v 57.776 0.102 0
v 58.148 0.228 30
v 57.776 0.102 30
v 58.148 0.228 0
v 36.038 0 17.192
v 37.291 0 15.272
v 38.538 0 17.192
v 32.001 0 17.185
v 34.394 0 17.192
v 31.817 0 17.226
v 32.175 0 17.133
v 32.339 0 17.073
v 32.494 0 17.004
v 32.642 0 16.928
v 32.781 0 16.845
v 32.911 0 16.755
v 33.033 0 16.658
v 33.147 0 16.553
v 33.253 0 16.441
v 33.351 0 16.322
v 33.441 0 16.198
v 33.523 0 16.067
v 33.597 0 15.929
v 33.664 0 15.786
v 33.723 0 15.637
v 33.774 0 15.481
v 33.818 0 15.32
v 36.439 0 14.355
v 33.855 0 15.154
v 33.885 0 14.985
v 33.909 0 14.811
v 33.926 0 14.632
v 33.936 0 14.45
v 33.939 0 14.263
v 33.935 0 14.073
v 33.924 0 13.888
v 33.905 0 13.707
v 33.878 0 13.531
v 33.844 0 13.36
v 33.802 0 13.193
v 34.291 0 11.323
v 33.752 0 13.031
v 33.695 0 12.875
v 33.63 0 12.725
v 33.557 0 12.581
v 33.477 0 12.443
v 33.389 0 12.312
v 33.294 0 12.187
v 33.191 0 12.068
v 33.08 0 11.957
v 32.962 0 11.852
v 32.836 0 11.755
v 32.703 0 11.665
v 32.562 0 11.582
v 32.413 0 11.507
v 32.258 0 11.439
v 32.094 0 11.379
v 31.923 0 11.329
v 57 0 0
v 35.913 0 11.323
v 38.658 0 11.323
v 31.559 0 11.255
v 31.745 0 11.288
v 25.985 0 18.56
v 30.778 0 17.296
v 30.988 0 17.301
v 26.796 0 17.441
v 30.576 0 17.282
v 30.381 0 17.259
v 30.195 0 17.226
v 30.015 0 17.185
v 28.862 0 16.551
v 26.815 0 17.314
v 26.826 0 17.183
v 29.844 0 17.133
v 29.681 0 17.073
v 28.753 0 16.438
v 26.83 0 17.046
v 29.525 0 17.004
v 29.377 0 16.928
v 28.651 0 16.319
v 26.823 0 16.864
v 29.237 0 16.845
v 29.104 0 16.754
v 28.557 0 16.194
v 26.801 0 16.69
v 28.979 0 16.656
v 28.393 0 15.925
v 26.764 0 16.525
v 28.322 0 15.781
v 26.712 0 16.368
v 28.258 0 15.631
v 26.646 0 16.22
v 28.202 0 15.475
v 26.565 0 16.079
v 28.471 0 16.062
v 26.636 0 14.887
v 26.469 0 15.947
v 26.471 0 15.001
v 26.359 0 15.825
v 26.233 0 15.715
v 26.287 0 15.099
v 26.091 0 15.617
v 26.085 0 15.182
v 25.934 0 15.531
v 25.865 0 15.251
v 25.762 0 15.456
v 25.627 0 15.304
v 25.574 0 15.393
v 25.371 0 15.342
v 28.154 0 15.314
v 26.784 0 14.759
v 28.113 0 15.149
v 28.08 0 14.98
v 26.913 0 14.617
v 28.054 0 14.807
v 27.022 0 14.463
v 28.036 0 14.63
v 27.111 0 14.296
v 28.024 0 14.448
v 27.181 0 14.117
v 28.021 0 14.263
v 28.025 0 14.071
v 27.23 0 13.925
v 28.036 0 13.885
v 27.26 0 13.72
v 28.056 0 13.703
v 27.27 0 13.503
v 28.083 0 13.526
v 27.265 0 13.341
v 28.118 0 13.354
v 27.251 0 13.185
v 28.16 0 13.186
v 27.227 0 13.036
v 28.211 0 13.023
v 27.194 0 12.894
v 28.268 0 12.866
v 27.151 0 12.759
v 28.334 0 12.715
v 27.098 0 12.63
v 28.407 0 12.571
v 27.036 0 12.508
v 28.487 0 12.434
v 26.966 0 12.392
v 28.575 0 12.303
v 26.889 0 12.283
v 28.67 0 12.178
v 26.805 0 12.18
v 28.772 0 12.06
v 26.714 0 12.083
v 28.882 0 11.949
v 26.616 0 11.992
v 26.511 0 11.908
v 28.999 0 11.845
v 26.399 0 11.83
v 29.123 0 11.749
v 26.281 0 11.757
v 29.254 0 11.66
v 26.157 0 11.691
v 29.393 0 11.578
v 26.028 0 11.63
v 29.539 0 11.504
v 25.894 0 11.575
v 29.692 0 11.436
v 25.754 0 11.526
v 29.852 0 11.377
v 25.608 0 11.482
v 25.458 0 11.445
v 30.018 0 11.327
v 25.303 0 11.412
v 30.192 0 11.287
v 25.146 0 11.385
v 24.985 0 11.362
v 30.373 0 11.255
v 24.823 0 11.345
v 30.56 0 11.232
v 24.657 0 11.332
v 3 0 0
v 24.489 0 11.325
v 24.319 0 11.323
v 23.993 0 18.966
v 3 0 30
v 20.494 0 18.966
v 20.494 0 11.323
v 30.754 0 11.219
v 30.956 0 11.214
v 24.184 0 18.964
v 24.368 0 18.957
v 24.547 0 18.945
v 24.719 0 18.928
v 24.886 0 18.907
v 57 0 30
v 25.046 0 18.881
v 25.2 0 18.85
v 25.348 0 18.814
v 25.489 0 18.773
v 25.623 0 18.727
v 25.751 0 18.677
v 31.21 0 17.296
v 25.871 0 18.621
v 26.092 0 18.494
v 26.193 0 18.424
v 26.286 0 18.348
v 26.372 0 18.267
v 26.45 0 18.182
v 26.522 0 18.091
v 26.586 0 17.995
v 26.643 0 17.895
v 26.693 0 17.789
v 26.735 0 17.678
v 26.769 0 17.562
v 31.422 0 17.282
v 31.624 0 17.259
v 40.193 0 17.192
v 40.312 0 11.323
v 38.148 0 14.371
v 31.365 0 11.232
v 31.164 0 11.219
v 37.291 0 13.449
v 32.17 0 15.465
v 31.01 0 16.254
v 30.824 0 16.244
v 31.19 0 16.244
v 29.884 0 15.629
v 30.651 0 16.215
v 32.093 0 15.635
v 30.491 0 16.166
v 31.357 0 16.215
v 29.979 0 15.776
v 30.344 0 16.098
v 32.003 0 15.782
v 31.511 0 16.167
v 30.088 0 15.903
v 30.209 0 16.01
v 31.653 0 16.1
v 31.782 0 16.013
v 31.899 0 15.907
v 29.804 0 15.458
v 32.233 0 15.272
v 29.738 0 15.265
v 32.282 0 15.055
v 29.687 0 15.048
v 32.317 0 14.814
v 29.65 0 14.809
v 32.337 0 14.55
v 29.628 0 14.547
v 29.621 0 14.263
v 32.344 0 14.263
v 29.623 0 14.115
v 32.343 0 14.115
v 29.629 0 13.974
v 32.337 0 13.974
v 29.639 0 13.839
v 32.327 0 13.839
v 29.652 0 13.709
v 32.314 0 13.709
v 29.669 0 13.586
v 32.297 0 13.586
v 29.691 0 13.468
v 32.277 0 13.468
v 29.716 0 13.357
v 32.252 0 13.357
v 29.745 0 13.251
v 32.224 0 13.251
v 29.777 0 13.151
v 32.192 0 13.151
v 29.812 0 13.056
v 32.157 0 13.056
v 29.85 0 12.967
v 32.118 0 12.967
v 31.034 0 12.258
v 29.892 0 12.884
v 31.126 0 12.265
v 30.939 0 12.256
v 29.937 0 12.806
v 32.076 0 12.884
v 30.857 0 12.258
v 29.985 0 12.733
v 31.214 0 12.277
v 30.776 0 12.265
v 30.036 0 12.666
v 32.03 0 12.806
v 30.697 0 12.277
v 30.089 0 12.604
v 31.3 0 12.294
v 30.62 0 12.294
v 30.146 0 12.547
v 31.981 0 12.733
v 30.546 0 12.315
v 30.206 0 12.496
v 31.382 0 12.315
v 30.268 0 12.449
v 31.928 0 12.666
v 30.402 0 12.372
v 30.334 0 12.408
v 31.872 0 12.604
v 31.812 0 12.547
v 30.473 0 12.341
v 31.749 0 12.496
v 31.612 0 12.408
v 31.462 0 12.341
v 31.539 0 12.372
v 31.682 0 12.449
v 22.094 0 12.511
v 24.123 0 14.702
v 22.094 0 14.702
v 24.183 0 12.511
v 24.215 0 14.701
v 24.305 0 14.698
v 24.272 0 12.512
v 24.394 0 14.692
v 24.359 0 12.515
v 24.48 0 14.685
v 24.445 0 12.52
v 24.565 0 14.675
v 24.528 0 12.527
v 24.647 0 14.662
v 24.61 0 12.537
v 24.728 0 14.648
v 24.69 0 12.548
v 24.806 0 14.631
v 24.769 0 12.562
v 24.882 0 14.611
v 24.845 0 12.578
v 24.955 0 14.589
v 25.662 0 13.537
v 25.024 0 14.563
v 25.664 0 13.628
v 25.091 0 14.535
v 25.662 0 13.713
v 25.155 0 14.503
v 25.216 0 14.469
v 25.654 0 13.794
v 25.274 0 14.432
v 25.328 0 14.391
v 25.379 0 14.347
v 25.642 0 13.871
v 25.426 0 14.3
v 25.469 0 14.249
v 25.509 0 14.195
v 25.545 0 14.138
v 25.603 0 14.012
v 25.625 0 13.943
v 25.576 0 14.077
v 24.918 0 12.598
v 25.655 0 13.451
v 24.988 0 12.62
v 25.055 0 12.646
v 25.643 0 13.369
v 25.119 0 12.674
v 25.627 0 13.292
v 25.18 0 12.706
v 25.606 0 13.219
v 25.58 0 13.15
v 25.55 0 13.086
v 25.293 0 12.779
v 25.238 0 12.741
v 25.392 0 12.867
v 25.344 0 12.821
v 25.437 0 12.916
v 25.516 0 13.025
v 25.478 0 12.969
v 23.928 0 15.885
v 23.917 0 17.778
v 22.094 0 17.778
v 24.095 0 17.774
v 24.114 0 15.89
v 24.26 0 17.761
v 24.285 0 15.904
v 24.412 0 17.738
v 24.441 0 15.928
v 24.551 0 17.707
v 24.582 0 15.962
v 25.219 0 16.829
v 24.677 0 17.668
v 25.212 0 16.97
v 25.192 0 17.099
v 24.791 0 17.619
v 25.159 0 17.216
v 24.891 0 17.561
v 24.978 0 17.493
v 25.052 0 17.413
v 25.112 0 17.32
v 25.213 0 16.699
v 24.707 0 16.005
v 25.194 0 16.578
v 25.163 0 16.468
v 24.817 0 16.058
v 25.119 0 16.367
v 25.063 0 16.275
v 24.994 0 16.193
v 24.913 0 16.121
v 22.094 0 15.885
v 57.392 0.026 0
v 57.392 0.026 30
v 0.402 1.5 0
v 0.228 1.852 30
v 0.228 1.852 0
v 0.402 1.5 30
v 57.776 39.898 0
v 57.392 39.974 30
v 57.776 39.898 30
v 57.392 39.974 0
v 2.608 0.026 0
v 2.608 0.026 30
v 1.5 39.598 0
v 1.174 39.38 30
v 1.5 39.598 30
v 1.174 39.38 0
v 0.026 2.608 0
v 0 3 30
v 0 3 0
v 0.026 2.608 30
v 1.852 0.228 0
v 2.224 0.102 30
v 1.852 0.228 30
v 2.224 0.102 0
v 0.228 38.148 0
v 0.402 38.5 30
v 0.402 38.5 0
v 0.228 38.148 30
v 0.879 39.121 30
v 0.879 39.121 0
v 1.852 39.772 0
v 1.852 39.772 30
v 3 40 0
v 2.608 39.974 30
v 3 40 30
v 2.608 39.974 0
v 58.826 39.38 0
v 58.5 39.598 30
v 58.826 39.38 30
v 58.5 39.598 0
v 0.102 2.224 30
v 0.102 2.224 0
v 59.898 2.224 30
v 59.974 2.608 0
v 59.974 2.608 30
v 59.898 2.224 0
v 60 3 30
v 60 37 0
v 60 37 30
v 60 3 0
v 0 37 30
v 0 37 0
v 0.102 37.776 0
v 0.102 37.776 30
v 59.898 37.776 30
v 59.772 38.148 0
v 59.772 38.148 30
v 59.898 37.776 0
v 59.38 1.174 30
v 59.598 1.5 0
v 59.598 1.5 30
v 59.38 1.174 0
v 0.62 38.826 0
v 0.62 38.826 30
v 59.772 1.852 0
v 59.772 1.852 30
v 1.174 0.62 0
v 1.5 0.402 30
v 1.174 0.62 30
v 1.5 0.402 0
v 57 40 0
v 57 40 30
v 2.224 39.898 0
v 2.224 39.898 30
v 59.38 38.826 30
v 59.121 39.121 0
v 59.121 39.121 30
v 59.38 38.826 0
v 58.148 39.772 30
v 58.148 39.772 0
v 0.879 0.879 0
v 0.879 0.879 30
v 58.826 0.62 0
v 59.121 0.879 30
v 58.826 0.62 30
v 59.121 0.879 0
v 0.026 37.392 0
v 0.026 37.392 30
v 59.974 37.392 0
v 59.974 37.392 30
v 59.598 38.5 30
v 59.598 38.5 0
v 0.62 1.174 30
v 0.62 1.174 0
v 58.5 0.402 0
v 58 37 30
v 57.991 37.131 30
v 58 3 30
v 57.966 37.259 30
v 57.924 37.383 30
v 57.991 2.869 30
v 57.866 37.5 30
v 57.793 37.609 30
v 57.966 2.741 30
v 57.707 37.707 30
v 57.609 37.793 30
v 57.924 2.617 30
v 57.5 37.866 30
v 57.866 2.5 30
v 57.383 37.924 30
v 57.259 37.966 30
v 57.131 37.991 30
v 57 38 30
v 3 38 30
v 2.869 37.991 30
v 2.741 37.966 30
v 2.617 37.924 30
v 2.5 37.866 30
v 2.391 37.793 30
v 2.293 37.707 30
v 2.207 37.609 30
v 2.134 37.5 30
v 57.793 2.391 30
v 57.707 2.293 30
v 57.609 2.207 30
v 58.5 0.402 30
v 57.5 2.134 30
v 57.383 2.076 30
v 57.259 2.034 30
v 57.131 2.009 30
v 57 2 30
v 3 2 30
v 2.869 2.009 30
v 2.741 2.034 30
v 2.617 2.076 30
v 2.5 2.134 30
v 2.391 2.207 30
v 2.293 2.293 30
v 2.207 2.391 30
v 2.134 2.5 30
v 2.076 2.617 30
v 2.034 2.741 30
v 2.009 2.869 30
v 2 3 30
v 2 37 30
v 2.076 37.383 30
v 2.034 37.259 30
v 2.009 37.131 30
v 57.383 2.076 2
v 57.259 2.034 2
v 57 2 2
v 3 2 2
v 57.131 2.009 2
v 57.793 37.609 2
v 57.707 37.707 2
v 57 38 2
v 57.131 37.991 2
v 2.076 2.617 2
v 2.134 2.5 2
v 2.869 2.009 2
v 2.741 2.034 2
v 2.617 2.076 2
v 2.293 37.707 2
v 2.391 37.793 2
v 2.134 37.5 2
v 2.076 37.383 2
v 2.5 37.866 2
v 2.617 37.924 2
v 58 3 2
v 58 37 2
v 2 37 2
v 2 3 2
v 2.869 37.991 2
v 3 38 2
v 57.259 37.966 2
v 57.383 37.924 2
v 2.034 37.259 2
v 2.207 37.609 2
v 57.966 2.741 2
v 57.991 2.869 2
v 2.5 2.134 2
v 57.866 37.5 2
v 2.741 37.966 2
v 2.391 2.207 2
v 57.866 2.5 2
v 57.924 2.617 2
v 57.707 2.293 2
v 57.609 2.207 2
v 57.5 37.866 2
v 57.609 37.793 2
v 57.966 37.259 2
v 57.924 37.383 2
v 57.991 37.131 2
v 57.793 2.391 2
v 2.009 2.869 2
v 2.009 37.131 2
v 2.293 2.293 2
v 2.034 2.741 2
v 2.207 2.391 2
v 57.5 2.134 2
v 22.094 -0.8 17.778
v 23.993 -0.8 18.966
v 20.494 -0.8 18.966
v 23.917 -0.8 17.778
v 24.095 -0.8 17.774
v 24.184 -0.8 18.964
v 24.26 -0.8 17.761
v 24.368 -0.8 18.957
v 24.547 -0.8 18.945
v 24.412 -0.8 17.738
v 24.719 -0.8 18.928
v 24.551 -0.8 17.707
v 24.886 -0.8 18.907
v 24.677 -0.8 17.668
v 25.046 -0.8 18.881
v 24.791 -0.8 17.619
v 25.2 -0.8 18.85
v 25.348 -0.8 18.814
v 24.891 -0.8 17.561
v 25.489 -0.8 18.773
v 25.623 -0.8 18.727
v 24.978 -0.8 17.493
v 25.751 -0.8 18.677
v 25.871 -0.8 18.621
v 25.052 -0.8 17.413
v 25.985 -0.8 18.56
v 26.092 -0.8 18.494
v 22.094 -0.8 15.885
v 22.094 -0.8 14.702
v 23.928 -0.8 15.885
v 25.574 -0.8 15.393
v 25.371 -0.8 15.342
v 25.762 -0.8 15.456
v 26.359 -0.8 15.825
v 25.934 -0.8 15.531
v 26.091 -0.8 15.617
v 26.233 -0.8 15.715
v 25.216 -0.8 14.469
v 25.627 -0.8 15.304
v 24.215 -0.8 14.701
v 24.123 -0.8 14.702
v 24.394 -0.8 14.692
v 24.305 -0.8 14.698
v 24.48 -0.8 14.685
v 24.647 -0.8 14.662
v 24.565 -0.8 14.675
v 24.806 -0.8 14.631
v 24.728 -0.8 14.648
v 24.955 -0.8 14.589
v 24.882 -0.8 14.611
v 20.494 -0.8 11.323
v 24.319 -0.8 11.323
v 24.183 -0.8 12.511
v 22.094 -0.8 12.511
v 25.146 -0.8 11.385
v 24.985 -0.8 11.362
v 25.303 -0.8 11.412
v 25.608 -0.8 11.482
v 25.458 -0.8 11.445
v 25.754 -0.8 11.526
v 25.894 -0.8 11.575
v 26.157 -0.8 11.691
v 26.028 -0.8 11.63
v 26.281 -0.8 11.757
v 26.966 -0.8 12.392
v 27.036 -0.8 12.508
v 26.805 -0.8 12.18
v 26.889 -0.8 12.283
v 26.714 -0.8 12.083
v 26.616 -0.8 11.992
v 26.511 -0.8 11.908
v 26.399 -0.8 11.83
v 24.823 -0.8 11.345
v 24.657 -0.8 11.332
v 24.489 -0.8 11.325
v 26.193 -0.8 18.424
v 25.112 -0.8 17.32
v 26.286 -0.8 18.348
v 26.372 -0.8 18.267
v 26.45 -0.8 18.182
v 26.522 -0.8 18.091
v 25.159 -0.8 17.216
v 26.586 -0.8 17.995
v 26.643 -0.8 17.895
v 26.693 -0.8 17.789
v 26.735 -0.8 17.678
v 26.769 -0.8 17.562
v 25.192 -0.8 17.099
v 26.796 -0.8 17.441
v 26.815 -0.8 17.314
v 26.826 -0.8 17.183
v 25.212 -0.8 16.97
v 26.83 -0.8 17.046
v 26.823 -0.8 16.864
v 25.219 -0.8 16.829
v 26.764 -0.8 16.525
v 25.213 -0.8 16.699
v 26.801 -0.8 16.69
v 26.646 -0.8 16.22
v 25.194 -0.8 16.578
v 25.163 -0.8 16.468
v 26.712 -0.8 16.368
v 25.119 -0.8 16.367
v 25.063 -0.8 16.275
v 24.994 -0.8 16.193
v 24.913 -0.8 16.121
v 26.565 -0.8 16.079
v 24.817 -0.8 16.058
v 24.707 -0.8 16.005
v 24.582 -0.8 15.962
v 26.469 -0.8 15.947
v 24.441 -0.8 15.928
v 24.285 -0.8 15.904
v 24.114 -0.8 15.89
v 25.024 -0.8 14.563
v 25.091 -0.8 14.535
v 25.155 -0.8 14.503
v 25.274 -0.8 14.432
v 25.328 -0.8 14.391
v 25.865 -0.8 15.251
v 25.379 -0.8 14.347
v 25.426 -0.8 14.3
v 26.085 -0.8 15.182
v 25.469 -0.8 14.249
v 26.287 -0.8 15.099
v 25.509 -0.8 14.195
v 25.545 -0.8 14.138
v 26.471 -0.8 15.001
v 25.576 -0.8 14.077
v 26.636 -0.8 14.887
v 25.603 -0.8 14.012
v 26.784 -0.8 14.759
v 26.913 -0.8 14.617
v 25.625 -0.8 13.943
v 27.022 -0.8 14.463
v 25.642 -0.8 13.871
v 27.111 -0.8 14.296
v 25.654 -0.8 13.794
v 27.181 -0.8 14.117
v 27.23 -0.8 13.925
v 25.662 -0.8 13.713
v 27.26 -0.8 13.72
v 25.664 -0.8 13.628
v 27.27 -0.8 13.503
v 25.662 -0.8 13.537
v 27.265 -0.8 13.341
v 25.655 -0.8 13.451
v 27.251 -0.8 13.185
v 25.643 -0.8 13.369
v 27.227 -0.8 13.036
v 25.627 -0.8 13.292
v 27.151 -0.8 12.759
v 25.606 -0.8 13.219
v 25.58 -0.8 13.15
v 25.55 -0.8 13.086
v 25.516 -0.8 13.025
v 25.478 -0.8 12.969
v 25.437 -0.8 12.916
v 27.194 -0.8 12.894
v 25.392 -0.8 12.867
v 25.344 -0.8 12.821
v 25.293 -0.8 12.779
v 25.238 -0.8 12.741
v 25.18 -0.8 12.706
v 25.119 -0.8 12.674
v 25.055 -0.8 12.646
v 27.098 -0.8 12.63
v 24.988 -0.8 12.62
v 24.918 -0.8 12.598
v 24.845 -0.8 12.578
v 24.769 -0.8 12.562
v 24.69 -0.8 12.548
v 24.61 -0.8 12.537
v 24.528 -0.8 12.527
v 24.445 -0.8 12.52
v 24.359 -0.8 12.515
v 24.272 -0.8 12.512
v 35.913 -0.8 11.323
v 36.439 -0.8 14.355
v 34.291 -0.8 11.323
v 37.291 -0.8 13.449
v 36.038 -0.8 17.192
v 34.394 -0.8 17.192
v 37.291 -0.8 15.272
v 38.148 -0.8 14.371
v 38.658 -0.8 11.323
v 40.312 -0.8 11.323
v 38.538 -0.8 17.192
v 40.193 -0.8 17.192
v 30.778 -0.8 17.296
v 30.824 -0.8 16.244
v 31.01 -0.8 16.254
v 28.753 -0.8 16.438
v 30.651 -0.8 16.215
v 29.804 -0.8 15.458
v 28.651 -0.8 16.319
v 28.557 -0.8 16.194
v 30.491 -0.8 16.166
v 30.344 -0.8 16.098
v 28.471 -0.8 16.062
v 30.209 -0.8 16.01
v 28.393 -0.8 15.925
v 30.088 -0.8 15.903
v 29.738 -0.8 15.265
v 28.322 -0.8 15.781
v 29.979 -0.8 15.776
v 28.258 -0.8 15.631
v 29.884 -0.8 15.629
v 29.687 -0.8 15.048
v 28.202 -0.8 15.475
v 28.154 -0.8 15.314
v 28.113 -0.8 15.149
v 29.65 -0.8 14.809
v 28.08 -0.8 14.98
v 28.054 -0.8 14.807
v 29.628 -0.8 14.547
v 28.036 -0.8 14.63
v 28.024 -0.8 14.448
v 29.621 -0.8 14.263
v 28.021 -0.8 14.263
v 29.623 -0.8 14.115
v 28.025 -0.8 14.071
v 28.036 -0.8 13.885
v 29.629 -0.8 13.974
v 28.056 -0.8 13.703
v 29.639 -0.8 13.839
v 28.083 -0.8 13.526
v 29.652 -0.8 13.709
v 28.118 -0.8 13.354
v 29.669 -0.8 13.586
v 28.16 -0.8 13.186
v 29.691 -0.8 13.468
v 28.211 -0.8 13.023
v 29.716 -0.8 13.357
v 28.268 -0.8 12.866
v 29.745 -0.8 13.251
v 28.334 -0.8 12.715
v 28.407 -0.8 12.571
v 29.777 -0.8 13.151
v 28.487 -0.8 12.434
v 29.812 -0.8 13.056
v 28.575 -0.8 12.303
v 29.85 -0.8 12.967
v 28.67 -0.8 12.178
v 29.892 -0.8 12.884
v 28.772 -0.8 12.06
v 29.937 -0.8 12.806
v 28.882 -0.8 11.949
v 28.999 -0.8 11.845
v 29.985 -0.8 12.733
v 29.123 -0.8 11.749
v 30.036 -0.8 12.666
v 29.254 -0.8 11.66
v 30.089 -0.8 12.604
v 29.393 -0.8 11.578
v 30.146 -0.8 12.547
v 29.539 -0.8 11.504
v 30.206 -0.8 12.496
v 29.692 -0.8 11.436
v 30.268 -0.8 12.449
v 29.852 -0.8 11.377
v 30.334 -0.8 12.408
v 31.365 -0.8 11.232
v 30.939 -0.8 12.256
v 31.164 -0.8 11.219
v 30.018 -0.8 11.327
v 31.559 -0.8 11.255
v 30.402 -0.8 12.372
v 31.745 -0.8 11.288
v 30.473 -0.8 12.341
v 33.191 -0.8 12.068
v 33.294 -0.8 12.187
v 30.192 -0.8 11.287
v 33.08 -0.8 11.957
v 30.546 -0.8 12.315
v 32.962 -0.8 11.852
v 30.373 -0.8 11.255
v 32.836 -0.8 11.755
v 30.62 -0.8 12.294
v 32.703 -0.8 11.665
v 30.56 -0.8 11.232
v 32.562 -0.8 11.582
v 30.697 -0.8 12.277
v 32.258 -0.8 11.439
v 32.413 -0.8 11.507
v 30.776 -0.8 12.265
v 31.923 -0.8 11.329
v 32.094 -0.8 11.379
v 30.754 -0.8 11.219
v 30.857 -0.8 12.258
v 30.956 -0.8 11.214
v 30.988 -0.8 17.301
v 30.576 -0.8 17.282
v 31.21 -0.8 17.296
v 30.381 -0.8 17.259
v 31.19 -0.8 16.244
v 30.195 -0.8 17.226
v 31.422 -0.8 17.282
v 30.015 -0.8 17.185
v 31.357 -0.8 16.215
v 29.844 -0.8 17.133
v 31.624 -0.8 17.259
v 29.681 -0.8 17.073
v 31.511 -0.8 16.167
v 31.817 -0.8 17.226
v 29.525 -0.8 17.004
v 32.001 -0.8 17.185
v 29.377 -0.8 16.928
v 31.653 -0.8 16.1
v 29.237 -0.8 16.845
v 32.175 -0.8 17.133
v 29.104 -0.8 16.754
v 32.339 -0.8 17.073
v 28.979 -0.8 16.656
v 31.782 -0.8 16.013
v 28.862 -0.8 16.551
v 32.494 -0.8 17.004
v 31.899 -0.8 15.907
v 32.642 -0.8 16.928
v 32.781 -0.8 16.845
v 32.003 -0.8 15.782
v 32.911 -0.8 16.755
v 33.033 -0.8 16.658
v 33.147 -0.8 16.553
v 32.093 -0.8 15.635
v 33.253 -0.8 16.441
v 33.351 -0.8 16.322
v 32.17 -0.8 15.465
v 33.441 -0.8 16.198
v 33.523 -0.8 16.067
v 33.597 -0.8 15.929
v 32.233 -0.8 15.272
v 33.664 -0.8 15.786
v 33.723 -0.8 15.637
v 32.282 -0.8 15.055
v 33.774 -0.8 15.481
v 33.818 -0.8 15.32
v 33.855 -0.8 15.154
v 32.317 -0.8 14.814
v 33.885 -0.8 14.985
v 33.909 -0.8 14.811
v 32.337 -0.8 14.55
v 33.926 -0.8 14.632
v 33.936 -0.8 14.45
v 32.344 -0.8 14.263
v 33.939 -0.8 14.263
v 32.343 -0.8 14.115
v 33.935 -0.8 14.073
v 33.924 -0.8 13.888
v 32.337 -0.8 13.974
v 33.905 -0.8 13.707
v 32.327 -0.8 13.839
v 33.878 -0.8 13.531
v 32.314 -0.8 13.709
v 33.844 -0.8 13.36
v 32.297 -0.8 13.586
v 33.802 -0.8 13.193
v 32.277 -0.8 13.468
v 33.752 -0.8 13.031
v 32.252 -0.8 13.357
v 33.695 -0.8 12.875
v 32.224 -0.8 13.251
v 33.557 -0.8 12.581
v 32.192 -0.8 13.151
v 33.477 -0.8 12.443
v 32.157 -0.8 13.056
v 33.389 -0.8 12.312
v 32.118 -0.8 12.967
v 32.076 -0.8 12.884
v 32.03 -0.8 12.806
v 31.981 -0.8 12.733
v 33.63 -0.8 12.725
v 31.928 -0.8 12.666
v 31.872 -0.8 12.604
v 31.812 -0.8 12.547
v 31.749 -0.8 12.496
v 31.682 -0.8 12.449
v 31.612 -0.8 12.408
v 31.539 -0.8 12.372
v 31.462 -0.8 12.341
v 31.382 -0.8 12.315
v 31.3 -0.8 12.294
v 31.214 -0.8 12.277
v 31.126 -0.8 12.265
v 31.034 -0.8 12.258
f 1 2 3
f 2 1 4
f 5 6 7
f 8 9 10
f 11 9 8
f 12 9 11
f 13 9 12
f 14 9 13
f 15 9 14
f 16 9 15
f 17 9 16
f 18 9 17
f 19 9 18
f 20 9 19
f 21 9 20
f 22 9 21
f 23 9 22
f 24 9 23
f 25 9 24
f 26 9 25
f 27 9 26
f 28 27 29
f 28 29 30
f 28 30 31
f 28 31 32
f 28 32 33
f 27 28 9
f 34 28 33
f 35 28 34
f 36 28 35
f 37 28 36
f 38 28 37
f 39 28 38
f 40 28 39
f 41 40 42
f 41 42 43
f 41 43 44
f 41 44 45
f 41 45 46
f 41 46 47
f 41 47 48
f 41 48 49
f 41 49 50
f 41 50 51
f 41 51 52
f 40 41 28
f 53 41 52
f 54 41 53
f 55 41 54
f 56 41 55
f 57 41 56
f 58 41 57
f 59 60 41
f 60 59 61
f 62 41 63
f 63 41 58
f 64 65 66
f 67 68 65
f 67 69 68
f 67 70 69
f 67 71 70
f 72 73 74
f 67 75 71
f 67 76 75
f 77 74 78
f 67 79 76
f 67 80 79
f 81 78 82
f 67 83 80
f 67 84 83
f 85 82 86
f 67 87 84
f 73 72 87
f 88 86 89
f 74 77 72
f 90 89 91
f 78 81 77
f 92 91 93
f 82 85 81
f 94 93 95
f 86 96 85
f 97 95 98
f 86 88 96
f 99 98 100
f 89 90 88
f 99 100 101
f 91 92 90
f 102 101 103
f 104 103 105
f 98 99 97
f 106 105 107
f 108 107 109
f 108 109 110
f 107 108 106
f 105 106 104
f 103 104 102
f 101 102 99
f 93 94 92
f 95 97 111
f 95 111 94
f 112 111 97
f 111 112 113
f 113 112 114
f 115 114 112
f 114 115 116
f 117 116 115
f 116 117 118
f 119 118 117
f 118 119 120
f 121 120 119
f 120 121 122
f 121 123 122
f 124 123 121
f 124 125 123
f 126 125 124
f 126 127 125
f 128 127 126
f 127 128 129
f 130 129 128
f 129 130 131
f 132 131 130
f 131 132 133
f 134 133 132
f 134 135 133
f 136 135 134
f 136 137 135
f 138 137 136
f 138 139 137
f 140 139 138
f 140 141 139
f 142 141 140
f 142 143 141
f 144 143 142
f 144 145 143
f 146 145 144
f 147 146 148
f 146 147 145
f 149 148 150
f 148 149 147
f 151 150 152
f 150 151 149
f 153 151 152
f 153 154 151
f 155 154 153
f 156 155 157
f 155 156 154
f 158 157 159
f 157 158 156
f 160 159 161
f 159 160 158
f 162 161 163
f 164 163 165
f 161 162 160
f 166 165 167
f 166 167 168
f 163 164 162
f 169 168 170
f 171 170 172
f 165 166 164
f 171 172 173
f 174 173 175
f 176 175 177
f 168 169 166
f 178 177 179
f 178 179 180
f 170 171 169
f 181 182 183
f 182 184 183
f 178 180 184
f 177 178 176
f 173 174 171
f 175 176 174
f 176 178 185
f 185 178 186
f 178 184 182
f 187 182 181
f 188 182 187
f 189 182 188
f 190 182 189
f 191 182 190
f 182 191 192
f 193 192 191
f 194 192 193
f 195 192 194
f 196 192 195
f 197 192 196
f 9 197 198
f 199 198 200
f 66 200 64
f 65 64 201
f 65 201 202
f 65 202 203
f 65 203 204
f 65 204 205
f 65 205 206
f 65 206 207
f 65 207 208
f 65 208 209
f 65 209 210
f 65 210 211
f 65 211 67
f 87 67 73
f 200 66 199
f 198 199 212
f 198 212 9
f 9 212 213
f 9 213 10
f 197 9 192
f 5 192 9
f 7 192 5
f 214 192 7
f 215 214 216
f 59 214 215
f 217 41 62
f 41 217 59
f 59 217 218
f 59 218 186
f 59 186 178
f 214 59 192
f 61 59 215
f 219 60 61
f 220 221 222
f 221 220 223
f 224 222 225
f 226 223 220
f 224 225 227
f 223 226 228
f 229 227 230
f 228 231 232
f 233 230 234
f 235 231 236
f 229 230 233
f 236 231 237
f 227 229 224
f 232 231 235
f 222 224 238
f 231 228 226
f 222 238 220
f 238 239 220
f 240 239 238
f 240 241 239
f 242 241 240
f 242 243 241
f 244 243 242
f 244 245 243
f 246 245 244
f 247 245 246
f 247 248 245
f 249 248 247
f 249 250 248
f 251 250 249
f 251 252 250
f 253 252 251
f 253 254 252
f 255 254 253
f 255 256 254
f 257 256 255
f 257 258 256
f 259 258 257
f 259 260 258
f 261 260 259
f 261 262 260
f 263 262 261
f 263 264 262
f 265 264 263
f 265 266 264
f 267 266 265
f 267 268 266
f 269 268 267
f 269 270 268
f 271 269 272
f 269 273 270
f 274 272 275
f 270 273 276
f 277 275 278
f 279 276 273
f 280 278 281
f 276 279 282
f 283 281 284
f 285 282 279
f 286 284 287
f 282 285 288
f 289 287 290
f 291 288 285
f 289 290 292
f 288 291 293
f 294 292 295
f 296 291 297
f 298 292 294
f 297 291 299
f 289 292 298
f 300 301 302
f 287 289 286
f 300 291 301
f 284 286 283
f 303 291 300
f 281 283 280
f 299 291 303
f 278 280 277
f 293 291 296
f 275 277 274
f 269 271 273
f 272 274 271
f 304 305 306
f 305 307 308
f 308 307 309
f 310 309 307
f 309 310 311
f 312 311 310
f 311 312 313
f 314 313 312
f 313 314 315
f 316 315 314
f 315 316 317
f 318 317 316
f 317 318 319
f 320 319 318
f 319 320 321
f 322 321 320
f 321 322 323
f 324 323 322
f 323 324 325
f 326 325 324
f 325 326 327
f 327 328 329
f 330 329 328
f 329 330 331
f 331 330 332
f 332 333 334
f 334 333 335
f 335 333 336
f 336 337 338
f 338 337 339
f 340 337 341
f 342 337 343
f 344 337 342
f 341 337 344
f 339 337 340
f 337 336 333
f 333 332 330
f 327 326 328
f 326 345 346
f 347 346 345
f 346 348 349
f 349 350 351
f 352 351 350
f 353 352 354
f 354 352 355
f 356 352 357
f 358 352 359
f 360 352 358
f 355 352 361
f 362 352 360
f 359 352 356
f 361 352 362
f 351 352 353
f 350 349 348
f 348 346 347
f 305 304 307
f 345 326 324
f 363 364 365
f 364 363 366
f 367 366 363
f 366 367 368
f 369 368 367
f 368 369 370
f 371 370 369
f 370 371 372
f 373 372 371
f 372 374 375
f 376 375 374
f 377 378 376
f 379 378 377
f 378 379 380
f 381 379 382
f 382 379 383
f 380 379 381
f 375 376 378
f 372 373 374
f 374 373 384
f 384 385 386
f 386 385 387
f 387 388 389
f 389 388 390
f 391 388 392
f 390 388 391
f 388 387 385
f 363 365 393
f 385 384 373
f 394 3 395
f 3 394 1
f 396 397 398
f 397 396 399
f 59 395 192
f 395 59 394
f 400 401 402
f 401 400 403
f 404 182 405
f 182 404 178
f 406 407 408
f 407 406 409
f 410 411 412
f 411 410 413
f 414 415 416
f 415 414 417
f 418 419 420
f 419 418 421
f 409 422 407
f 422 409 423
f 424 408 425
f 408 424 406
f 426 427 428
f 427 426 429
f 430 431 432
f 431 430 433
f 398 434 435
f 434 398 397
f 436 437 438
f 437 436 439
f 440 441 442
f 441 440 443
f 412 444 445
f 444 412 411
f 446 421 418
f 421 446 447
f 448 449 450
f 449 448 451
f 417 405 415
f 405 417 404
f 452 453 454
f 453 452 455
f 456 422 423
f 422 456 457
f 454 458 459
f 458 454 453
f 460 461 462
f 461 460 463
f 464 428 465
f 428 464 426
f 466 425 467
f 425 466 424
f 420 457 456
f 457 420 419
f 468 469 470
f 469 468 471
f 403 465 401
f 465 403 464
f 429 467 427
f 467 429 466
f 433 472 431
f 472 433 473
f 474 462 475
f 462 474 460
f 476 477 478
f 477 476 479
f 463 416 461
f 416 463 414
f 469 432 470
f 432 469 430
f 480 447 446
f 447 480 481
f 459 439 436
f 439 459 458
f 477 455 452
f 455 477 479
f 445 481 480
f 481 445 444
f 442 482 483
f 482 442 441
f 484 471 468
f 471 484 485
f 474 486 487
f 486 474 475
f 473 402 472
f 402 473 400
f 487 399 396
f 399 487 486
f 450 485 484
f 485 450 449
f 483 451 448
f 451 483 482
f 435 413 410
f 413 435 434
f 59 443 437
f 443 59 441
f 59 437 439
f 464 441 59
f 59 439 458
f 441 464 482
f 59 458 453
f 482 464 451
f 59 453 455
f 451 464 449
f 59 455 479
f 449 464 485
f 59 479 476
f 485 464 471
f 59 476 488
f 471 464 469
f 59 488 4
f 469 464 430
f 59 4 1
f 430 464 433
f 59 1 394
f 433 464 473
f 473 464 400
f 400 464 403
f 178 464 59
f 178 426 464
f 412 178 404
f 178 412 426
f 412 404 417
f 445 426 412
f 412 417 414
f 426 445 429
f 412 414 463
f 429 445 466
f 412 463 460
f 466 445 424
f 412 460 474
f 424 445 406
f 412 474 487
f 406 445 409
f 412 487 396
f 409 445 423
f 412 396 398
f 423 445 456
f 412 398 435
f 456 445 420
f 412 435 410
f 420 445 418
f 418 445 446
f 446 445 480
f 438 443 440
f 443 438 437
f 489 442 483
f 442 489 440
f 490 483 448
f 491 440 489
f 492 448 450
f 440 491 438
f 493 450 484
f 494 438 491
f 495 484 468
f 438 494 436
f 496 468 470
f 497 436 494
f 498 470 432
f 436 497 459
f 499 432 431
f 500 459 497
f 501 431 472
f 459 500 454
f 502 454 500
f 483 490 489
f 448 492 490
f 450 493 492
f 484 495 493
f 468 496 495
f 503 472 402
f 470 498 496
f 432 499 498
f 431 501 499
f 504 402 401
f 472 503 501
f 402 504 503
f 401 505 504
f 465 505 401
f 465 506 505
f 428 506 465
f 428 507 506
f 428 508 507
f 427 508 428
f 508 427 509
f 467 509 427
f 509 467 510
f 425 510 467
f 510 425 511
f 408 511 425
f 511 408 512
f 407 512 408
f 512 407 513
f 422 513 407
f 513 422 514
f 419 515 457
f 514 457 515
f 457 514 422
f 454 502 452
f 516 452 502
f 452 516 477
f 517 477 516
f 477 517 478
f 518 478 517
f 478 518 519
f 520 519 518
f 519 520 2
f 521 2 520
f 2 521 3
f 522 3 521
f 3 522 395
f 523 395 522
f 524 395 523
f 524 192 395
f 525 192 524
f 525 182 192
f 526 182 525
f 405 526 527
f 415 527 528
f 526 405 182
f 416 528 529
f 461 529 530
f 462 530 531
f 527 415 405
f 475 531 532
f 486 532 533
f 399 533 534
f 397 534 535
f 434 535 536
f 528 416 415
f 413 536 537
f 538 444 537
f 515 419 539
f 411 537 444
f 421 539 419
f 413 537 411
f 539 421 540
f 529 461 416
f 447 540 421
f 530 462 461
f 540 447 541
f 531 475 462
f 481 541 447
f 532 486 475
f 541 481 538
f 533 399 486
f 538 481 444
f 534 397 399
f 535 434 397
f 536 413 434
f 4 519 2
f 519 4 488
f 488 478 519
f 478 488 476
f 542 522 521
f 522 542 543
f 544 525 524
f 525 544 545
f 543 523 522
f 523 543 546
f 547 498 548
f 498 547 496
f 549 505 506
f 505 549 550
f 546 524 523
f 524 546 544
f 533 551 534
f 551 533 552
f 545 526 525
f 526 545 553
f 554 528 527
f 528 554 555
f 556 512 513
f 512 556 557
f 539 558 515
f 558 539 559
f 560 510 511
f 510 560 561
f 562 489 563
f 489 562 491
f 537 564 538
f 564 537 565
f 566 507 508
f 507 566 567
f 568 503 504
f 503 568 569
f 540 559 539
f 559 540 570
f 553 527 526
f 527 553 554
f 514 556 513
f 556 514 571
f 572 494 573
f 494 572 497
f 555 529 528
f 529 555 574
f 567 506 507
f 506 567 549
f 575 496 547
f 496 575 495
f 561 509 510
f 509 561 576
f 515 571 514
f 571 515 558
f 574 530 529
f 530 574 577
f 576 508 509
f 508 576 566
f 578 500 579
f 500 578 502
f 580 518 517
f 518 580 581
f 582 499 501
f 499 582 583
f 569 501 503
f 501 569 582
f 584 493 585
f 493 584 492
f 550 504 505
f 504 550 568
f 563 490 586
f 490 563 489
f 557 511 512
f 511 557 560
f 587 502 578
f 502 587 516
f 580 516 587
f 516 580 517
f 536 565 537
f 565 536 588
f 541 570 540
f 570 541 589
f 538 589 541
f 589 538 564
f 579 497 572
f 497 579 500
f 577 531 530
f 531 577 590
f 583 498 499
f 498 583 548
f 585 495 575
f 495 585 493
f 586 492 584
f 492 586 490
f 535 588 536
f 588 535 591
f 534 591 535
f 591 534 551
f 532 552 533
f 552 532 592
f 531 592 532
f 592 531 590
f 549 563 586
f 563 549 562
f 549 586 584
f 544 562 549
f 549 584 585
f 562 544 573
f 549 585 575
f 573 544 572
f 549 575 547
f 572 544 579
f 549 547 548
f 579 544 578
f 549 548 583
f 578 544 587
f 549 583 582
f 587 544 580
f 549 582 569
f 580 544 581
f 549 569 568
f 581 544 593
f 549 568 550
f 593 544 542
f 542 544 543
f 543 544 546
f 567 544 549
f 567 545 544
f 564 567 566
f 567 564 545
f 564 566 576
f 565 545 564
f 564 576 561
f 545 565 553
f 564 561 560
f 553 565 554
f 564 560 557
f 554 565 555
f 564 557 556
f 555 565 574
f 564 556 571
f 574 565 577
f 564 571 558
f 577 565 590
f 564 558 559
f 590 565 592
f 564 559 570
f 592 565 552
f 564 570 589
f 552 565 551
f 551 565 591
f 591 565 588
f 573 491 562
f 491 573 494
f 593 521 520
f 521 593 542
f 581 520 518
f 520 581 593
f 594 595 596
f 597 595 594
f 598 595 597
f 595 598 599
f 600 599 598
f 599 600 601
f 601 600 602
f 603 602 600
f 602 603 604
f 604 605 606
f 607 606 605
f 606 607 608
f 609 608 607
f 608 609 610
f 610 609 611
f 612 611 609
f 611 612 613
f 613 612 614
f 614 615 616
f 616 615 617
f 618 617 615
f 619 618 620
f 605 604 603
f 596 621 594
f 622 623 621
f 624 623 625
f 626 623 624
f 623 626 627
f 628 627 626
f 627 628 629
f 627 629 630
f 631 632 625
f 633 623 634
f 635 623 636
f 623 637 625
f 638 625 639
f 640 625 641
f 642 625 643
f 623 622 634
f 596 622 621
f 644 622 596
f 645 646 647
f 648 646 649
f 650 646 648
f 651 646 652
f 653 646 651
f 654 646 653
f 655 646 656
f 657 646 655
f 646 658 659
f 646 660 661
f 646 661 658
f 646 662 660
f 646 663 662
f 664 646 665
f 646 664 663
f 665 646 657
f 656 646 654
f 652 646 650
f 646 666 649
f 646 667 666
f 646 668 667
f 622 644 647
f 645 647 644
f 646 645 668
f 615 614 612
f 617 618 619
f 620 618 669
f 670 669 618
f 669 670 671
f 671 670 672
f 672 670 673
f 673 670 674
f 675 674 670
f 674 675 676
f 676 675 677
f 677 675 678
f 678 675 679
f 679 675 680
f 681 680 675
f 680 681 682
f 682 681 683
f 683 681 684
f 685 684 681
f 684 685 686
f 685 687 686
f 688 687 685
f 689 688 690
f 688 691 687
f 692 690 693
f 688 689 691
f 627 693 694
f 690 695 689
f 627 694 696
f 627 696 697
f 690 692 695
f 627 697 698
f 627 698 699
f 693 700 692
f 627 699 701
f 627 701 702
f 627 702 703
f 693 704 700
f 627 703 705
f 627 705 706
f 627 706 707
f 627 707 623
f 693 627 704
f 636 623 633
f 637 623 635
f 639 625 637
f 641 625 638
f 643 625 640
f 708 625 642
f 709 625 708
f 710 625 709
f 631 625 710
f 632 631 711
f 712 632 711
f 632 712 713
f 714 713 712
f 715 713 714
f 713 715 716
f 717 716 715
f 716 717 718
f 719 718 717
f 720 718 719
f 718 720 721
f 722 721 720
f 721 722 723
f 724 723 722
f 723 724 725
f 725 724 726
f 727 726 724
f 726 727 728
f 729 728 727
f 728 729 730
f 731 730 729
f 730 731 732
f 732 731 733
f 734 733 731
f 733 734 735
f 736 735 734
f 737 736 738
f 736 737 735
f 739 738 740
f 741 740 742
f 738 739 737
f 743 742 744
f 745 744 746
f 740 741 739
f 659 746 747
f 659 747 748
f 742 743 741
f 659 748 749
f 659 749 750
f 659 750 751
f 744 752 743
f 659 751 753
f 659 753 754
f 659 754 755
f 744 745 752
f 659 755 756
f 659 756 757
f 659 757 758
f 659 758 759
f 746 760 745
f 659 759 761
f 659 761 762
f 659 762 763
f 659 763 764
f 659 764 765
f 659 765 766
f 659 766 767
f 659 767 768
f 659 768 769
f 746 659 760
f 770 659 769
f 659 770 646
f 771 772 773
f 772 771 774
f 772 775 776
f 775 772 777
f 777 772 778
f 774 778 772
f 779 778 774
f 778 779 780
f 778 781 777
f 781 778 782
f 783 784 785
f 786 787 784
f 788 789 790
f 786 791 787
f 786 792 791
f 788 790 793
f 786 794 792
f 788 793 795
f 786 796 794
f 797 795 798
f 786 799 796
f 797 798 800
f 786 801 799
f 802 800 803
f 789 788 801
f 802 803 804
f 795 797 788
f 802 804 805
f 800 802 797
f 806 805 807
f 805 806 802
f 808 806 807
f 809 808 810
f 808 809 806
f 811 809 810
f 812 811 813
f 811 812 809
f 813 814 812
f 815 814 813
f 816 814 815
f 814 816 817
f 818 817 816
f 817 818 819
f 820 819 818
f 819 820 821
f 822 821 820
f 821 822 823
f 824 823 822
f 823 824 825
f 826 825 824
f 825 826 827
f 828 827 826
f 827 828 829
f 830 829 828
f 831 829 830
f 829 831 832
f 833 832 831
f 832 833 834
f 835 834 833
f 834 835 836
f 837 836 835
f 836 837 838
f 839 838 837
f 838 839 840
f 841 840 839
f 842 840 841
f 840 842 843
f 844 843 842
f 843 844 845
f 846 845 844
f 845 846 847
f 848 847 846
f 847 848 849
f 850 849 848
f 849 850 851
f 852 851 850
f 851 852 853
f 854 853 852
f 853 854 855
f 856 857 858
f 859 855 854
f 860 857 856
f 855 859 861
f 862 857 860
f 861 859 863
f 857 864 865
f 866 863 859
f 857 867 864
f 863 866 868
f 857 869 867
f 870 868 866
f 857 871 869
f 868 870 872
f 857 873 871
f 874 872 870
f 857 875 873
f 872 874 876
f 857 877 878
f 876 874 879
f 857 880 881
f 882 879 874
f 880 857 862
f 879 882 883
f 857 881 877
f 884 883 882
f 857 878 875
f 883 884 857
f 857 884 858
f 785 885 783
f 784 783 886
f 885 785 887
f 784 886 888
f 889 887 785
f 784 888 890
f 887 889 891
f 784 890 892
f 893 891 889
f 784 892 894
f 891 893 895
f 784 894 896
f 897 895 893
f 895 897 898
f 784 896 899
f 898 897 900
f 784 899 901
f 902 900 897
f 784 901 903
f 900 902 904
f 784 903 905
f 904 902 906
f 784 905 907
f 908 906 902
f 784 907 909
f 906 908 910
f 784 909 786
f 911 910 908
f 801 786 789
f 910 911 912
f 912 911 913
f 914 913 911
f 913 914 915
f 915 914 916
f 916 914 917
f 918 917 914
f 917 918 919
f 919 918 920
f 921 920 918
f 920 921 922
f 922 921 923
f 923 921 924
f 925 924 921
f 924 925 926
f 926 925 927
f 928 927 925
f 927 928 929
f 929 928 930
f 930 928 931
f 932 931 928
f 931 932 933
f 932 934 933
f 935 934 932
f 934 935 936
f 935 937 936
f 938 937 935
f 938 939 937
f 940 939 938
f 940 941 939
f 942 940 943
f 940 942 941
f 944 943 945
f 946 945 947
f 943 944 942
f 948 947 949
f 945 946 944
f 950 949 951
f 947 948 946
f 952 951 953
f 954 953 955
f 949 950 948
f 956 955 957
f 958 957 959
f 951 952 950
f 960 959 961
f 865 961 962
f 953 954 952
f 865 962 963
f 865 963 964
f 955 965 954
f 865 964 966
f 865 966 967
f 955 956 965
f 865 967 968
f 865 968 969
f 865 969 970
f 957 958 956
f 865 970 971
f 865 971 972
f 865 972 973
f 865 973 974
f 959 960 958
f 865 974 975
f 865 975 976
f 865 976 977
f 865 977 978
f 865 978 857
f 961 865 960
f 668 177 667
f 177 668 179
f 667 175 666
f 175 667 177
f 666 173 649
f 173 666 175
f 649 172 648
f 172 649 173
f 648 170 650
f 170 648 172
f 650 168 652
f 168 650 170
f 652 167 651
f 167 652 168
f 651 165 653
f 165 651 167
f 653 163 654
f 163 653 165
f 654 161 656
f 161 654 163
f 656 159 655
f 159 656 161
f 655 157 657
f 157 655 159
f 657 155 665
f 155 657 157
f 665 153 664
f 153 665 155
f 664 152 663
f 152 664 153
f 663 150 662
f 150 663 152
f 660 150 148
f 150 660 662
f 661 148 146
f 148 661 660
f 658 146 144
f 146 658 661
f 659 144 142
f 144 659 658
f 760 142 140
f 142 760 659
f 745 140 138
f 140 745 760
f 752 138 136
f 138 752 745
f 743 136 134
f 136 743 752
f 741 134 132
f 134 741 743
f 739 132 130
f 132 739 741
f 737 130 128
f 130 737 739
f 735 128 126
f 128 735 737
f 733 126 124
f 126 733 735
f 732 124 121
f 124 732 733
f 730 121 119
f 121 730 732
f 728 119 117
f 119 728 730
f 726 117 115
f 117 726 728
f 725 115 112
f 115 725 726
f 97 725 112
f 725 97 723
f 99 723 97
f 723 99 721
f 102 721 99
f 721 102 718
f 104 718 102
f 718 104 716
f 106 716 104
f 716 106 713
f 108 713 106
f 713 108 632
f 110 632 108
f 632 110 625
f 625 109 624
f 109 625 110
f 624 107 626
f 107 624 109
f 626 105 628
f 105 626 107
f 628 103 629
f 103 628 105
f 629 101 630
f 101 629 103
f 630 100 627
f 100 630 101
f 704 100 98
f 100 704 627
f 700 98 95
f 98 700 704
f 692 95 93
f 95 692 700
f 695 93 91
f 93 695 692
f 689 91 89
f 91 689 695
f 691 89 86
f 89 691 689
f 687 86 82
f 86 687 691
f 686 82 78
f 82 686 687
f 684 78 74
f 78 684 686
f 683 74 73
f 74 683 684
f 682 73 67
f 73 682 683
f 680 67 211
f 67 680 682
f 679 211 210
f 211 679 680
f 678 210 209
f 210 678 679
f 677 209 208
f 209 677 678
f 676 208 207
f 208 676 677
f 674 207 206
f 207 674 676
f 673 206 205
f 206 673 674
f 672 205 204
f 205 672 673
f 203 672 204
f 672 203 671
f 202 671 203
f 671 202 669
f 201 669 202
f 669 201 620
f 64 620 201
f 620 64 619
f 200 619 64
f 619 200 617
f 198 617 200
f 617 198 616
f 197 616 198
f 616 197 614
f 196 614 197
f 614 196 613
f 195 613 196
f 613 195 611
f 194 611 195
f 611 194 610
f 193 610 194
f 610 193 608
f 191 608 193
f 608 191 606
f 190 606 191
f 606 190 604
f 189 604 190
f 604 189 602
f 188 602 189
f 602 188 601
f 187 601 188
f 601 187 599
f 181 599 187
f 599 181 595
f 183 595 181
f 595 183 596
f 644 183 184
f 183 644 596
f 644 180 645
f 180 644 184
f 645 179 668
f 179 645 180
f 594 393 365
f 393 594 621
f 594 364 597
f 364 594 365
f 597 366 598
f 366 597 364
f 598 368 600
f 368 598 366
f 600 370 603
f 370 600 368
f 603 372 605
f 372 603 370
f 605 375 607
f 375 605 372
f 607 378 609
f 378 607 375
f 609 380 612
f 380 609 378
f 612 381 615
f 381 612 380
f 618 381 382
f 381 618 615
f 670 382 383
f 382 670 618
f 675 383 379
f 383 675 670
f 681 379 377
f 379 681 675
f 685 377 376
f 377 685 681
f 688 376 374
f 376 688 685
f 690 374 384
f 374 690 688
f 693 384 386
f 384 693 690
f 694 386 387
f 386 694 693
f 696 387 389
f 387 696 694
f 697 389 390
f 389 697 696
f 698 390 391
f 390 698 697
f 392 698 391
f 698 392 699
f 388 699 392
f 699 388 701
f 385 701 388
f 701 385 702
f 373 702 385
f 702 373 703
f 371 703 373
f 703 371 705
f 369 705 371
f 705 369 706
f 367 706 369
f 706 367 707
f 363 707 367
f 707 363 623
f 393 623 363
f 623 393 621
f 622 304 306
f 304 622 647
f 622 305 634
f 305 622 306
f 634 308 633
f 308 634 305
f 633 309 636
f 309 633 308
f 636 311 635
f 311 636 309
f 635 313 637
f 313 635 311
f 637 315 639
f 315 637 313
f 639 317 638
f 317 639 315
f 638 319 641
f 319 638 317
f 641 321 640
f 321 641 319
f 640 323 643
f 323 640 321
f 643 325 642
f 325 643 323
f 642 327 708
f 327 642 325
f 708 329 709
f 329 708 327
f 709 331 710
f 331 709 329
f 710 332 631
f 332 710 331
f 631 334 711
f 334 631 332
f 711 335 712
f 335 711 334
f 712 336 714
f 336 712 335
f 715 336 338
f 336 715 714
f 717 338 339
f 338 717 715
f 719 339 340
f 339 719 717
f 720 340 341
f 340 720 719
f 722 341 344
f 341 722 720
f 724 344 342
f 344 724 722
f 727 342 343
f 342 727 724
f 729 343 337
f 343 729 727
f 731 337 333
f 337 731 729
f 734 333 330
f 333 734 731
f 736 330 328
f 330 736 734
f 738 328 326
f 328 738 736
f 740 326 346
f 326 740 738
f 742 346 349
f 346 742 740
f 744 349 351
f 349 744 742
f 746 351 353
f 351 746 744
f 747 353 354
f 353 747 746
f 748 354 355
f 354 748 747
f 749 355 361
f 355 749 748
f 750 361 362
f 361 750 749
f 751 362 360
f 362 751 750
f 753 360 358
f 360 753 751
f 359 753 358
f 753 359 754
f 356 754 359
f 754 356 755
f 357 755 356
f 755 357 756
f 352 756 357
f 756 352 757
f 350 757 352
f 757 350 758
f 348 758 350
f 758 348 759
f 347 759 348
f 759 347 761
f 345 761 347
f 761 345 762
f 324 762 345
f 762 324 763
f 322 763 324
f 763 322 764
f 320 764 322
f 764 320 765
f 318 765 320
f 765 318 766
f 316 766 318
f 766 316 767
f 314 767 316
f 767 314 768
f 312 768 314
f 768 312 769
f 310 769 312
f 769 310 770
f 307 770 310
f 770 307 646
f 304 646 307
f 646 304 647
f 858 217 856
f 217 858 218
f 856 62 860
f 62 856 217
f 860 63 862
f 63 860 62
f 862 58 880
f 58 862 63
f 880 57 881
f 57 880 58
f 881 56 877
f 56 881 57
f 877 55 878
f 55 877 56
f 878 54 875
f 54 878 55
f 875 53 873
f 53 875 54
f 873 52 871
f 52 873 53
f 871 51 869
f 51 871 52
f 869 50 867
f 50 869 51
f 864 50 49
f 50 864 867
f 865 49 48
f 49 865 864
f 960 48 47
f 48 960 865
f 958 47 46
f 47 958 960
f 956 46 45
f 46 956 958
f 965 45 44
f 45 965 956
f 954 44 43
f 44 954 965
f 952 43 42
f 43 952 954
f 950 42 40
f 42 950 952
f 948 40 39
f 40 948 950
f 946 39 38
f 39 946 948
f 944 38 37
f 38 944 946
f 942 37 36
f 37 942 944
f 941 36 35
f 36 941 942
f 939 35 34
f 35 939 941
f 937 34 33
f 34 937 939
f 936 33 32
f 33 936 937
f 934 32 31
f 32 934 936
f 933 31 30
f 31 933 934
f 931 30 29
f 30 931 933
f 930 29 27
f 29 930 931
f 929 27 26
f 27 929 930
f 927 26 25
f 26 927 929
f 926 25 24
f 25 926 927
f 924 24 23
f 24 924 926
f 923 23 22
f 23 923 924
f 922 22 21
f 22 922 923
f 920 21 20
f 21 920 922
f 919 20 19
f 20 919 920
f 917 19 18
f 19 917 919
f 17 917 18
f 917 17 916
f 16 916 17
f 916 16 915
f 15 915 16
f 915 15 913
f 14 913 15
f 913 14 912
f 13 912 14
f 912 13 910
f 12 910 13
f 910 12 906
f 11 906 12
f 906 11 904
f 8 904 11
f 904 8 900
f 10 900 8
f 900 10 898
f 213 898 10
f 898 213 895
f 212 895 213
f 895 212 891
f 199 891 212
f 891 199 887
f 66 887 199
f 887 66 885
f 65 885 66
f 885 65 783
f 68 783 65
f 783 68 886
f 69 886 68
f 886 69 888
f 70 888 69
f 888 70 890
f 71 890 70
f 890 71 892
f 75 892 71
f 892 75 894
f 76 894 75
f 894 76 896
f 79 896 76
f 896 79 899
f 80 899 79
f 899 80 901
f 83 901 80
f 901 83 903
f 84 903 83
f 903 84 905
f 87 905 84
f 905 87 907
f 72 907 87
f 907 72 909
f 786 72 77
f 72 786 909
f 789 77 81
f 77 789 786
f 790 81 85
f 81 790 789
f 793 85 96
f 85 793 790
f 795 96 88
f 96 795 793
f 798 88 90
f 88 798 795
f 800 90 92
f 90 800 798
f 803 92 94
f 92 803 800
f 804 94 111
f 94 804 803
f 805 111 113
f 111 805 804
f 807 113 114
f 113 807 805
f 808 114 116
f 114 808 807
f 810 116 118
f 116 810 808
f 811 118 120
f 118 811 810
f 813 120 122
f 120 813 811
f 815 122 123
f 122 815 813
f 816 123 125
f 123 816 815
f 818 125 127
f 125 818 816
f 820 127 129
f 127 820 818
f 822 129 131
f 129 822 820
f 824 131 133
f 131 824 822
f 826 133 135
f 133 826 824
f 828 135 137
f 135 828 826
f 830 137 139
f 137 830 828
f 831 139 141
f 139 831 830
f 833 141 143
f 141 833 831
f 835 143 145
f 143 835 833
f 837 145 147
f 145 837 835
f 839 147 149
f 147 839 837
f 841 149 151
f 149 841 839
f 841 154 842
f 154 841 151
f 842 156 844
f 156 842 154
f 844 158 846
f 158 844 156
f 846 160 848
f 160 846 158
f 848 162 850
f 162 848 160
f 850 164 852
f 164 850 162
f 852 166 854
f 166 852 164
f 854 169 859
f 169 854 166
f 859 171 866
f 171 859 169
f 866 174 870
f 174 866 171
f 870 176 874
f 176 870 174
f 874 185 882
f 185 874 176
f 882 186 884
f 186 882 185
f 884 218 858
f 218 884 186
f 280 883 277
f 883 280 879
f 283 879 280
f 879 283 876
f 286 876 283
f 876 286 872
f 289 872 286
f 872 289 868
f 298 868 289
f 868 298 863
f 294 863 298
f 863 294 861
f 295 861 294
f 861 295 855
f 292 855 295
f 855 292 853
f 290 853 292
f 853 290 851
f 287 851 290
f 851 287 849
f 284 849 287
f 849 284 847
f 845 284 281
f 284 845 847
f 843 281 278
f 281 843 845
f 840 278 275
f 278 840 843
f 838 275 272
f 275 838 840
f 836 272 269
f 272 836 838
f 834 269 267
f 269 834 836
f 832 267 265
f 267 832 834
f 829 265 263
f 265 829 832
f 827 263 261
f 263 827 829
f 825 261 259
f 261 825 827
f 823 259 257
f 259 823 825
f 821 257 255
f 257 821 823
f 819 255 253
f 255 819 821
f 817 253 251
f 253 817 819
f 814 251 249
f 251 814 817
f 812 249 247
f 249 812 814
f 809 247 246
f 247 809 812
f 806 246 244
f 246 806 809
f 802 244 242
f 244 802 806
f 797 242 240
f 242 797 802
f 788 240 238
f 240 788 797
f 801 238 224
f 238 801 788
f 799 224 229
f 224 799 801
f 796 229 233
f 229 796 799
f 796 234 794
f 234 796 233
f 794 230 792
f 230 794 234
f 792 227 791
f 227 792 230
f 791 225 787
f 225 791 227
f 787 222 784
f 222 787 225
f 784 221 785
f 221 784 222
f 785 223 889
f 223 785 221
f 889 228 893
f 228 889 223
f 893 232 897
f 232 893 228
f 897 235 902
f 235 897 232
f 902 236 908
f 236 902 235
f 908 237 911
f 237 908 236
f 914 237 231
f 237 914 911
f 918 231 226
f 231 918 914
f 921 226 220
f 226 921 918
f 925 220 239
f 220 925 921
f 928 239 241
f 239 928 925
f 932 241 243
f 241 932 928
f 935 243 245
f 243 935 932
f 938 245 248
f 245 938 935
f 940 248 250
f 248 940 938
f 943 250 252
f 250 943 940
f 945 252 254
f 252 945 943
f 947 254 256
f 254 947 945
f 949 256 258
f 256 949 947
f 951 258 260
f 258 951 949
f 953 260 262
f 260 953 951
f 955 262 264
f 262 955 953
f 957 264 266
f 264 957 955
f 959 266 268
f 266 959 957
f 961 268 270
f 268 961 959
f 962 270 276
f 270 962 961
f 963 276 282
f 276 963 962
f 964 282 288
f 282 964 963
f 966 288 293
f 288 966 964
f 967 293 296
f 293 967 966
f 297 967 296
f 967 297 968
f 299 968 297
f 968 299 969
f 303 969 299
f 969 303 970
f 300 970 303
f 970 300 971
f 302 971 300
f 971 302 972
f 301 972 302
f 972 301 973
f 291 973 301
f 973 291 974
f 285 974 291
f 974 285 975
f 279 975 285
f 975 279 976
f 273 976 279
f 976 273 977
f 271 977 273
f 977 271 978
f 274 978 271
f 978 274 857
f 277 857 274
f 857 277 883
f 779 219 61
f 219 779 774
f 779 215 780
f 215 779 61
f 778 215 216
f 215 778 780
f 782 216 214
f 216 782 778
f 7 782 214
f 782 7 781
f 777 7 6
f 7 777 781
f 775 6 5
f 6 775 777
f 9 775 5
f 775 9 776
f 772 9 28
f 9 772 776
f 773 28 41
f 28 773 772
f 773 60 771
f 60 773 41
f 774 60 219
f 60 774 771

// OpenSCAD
// Label box: open storage box with a raised label on the front wall.
// Rendered by home3d.customize.render_template; every parameter can be overridden with -D.
// Units: mm. Print open side up.

text = "Box";
width = 60;     // outer X
depth = 40;     // outer Y
height = 30;    // outer Z
wall = 2;
font_size = 8;

text_depth = 0.8;    // how far the letters stand out of the front wall
corner_radius = 3;
font = "Liberation Sans:style=Bold";
$fn = 48;

module rounded_block(w, d, h, r) {
    rr = max(0.01, min(r, w / 2 - 0.01, d / 2 - 0.01));
    linear_extrude(height = h)
        offset(r = rr) offset(delta = -rr) square([w, d]);
}

union() {
    difference() {
        rounded_block(width, depth, height, corner_radius);
        translate([wall, wall, wall])
            rounded_block(width - 2 * wall, depth - 2 * wall, height, corner_radius - wall);
    }
    // front face is y = 0; letters read upright when looking at the front
    translate([width / 2, 0.01, height / 2])
        rotate([90, 0, 0])
            linear_extrude(height = text_depth + 0.01)
                text(text, size = font_size, font = font, halign = "center", valign = "center");
}
